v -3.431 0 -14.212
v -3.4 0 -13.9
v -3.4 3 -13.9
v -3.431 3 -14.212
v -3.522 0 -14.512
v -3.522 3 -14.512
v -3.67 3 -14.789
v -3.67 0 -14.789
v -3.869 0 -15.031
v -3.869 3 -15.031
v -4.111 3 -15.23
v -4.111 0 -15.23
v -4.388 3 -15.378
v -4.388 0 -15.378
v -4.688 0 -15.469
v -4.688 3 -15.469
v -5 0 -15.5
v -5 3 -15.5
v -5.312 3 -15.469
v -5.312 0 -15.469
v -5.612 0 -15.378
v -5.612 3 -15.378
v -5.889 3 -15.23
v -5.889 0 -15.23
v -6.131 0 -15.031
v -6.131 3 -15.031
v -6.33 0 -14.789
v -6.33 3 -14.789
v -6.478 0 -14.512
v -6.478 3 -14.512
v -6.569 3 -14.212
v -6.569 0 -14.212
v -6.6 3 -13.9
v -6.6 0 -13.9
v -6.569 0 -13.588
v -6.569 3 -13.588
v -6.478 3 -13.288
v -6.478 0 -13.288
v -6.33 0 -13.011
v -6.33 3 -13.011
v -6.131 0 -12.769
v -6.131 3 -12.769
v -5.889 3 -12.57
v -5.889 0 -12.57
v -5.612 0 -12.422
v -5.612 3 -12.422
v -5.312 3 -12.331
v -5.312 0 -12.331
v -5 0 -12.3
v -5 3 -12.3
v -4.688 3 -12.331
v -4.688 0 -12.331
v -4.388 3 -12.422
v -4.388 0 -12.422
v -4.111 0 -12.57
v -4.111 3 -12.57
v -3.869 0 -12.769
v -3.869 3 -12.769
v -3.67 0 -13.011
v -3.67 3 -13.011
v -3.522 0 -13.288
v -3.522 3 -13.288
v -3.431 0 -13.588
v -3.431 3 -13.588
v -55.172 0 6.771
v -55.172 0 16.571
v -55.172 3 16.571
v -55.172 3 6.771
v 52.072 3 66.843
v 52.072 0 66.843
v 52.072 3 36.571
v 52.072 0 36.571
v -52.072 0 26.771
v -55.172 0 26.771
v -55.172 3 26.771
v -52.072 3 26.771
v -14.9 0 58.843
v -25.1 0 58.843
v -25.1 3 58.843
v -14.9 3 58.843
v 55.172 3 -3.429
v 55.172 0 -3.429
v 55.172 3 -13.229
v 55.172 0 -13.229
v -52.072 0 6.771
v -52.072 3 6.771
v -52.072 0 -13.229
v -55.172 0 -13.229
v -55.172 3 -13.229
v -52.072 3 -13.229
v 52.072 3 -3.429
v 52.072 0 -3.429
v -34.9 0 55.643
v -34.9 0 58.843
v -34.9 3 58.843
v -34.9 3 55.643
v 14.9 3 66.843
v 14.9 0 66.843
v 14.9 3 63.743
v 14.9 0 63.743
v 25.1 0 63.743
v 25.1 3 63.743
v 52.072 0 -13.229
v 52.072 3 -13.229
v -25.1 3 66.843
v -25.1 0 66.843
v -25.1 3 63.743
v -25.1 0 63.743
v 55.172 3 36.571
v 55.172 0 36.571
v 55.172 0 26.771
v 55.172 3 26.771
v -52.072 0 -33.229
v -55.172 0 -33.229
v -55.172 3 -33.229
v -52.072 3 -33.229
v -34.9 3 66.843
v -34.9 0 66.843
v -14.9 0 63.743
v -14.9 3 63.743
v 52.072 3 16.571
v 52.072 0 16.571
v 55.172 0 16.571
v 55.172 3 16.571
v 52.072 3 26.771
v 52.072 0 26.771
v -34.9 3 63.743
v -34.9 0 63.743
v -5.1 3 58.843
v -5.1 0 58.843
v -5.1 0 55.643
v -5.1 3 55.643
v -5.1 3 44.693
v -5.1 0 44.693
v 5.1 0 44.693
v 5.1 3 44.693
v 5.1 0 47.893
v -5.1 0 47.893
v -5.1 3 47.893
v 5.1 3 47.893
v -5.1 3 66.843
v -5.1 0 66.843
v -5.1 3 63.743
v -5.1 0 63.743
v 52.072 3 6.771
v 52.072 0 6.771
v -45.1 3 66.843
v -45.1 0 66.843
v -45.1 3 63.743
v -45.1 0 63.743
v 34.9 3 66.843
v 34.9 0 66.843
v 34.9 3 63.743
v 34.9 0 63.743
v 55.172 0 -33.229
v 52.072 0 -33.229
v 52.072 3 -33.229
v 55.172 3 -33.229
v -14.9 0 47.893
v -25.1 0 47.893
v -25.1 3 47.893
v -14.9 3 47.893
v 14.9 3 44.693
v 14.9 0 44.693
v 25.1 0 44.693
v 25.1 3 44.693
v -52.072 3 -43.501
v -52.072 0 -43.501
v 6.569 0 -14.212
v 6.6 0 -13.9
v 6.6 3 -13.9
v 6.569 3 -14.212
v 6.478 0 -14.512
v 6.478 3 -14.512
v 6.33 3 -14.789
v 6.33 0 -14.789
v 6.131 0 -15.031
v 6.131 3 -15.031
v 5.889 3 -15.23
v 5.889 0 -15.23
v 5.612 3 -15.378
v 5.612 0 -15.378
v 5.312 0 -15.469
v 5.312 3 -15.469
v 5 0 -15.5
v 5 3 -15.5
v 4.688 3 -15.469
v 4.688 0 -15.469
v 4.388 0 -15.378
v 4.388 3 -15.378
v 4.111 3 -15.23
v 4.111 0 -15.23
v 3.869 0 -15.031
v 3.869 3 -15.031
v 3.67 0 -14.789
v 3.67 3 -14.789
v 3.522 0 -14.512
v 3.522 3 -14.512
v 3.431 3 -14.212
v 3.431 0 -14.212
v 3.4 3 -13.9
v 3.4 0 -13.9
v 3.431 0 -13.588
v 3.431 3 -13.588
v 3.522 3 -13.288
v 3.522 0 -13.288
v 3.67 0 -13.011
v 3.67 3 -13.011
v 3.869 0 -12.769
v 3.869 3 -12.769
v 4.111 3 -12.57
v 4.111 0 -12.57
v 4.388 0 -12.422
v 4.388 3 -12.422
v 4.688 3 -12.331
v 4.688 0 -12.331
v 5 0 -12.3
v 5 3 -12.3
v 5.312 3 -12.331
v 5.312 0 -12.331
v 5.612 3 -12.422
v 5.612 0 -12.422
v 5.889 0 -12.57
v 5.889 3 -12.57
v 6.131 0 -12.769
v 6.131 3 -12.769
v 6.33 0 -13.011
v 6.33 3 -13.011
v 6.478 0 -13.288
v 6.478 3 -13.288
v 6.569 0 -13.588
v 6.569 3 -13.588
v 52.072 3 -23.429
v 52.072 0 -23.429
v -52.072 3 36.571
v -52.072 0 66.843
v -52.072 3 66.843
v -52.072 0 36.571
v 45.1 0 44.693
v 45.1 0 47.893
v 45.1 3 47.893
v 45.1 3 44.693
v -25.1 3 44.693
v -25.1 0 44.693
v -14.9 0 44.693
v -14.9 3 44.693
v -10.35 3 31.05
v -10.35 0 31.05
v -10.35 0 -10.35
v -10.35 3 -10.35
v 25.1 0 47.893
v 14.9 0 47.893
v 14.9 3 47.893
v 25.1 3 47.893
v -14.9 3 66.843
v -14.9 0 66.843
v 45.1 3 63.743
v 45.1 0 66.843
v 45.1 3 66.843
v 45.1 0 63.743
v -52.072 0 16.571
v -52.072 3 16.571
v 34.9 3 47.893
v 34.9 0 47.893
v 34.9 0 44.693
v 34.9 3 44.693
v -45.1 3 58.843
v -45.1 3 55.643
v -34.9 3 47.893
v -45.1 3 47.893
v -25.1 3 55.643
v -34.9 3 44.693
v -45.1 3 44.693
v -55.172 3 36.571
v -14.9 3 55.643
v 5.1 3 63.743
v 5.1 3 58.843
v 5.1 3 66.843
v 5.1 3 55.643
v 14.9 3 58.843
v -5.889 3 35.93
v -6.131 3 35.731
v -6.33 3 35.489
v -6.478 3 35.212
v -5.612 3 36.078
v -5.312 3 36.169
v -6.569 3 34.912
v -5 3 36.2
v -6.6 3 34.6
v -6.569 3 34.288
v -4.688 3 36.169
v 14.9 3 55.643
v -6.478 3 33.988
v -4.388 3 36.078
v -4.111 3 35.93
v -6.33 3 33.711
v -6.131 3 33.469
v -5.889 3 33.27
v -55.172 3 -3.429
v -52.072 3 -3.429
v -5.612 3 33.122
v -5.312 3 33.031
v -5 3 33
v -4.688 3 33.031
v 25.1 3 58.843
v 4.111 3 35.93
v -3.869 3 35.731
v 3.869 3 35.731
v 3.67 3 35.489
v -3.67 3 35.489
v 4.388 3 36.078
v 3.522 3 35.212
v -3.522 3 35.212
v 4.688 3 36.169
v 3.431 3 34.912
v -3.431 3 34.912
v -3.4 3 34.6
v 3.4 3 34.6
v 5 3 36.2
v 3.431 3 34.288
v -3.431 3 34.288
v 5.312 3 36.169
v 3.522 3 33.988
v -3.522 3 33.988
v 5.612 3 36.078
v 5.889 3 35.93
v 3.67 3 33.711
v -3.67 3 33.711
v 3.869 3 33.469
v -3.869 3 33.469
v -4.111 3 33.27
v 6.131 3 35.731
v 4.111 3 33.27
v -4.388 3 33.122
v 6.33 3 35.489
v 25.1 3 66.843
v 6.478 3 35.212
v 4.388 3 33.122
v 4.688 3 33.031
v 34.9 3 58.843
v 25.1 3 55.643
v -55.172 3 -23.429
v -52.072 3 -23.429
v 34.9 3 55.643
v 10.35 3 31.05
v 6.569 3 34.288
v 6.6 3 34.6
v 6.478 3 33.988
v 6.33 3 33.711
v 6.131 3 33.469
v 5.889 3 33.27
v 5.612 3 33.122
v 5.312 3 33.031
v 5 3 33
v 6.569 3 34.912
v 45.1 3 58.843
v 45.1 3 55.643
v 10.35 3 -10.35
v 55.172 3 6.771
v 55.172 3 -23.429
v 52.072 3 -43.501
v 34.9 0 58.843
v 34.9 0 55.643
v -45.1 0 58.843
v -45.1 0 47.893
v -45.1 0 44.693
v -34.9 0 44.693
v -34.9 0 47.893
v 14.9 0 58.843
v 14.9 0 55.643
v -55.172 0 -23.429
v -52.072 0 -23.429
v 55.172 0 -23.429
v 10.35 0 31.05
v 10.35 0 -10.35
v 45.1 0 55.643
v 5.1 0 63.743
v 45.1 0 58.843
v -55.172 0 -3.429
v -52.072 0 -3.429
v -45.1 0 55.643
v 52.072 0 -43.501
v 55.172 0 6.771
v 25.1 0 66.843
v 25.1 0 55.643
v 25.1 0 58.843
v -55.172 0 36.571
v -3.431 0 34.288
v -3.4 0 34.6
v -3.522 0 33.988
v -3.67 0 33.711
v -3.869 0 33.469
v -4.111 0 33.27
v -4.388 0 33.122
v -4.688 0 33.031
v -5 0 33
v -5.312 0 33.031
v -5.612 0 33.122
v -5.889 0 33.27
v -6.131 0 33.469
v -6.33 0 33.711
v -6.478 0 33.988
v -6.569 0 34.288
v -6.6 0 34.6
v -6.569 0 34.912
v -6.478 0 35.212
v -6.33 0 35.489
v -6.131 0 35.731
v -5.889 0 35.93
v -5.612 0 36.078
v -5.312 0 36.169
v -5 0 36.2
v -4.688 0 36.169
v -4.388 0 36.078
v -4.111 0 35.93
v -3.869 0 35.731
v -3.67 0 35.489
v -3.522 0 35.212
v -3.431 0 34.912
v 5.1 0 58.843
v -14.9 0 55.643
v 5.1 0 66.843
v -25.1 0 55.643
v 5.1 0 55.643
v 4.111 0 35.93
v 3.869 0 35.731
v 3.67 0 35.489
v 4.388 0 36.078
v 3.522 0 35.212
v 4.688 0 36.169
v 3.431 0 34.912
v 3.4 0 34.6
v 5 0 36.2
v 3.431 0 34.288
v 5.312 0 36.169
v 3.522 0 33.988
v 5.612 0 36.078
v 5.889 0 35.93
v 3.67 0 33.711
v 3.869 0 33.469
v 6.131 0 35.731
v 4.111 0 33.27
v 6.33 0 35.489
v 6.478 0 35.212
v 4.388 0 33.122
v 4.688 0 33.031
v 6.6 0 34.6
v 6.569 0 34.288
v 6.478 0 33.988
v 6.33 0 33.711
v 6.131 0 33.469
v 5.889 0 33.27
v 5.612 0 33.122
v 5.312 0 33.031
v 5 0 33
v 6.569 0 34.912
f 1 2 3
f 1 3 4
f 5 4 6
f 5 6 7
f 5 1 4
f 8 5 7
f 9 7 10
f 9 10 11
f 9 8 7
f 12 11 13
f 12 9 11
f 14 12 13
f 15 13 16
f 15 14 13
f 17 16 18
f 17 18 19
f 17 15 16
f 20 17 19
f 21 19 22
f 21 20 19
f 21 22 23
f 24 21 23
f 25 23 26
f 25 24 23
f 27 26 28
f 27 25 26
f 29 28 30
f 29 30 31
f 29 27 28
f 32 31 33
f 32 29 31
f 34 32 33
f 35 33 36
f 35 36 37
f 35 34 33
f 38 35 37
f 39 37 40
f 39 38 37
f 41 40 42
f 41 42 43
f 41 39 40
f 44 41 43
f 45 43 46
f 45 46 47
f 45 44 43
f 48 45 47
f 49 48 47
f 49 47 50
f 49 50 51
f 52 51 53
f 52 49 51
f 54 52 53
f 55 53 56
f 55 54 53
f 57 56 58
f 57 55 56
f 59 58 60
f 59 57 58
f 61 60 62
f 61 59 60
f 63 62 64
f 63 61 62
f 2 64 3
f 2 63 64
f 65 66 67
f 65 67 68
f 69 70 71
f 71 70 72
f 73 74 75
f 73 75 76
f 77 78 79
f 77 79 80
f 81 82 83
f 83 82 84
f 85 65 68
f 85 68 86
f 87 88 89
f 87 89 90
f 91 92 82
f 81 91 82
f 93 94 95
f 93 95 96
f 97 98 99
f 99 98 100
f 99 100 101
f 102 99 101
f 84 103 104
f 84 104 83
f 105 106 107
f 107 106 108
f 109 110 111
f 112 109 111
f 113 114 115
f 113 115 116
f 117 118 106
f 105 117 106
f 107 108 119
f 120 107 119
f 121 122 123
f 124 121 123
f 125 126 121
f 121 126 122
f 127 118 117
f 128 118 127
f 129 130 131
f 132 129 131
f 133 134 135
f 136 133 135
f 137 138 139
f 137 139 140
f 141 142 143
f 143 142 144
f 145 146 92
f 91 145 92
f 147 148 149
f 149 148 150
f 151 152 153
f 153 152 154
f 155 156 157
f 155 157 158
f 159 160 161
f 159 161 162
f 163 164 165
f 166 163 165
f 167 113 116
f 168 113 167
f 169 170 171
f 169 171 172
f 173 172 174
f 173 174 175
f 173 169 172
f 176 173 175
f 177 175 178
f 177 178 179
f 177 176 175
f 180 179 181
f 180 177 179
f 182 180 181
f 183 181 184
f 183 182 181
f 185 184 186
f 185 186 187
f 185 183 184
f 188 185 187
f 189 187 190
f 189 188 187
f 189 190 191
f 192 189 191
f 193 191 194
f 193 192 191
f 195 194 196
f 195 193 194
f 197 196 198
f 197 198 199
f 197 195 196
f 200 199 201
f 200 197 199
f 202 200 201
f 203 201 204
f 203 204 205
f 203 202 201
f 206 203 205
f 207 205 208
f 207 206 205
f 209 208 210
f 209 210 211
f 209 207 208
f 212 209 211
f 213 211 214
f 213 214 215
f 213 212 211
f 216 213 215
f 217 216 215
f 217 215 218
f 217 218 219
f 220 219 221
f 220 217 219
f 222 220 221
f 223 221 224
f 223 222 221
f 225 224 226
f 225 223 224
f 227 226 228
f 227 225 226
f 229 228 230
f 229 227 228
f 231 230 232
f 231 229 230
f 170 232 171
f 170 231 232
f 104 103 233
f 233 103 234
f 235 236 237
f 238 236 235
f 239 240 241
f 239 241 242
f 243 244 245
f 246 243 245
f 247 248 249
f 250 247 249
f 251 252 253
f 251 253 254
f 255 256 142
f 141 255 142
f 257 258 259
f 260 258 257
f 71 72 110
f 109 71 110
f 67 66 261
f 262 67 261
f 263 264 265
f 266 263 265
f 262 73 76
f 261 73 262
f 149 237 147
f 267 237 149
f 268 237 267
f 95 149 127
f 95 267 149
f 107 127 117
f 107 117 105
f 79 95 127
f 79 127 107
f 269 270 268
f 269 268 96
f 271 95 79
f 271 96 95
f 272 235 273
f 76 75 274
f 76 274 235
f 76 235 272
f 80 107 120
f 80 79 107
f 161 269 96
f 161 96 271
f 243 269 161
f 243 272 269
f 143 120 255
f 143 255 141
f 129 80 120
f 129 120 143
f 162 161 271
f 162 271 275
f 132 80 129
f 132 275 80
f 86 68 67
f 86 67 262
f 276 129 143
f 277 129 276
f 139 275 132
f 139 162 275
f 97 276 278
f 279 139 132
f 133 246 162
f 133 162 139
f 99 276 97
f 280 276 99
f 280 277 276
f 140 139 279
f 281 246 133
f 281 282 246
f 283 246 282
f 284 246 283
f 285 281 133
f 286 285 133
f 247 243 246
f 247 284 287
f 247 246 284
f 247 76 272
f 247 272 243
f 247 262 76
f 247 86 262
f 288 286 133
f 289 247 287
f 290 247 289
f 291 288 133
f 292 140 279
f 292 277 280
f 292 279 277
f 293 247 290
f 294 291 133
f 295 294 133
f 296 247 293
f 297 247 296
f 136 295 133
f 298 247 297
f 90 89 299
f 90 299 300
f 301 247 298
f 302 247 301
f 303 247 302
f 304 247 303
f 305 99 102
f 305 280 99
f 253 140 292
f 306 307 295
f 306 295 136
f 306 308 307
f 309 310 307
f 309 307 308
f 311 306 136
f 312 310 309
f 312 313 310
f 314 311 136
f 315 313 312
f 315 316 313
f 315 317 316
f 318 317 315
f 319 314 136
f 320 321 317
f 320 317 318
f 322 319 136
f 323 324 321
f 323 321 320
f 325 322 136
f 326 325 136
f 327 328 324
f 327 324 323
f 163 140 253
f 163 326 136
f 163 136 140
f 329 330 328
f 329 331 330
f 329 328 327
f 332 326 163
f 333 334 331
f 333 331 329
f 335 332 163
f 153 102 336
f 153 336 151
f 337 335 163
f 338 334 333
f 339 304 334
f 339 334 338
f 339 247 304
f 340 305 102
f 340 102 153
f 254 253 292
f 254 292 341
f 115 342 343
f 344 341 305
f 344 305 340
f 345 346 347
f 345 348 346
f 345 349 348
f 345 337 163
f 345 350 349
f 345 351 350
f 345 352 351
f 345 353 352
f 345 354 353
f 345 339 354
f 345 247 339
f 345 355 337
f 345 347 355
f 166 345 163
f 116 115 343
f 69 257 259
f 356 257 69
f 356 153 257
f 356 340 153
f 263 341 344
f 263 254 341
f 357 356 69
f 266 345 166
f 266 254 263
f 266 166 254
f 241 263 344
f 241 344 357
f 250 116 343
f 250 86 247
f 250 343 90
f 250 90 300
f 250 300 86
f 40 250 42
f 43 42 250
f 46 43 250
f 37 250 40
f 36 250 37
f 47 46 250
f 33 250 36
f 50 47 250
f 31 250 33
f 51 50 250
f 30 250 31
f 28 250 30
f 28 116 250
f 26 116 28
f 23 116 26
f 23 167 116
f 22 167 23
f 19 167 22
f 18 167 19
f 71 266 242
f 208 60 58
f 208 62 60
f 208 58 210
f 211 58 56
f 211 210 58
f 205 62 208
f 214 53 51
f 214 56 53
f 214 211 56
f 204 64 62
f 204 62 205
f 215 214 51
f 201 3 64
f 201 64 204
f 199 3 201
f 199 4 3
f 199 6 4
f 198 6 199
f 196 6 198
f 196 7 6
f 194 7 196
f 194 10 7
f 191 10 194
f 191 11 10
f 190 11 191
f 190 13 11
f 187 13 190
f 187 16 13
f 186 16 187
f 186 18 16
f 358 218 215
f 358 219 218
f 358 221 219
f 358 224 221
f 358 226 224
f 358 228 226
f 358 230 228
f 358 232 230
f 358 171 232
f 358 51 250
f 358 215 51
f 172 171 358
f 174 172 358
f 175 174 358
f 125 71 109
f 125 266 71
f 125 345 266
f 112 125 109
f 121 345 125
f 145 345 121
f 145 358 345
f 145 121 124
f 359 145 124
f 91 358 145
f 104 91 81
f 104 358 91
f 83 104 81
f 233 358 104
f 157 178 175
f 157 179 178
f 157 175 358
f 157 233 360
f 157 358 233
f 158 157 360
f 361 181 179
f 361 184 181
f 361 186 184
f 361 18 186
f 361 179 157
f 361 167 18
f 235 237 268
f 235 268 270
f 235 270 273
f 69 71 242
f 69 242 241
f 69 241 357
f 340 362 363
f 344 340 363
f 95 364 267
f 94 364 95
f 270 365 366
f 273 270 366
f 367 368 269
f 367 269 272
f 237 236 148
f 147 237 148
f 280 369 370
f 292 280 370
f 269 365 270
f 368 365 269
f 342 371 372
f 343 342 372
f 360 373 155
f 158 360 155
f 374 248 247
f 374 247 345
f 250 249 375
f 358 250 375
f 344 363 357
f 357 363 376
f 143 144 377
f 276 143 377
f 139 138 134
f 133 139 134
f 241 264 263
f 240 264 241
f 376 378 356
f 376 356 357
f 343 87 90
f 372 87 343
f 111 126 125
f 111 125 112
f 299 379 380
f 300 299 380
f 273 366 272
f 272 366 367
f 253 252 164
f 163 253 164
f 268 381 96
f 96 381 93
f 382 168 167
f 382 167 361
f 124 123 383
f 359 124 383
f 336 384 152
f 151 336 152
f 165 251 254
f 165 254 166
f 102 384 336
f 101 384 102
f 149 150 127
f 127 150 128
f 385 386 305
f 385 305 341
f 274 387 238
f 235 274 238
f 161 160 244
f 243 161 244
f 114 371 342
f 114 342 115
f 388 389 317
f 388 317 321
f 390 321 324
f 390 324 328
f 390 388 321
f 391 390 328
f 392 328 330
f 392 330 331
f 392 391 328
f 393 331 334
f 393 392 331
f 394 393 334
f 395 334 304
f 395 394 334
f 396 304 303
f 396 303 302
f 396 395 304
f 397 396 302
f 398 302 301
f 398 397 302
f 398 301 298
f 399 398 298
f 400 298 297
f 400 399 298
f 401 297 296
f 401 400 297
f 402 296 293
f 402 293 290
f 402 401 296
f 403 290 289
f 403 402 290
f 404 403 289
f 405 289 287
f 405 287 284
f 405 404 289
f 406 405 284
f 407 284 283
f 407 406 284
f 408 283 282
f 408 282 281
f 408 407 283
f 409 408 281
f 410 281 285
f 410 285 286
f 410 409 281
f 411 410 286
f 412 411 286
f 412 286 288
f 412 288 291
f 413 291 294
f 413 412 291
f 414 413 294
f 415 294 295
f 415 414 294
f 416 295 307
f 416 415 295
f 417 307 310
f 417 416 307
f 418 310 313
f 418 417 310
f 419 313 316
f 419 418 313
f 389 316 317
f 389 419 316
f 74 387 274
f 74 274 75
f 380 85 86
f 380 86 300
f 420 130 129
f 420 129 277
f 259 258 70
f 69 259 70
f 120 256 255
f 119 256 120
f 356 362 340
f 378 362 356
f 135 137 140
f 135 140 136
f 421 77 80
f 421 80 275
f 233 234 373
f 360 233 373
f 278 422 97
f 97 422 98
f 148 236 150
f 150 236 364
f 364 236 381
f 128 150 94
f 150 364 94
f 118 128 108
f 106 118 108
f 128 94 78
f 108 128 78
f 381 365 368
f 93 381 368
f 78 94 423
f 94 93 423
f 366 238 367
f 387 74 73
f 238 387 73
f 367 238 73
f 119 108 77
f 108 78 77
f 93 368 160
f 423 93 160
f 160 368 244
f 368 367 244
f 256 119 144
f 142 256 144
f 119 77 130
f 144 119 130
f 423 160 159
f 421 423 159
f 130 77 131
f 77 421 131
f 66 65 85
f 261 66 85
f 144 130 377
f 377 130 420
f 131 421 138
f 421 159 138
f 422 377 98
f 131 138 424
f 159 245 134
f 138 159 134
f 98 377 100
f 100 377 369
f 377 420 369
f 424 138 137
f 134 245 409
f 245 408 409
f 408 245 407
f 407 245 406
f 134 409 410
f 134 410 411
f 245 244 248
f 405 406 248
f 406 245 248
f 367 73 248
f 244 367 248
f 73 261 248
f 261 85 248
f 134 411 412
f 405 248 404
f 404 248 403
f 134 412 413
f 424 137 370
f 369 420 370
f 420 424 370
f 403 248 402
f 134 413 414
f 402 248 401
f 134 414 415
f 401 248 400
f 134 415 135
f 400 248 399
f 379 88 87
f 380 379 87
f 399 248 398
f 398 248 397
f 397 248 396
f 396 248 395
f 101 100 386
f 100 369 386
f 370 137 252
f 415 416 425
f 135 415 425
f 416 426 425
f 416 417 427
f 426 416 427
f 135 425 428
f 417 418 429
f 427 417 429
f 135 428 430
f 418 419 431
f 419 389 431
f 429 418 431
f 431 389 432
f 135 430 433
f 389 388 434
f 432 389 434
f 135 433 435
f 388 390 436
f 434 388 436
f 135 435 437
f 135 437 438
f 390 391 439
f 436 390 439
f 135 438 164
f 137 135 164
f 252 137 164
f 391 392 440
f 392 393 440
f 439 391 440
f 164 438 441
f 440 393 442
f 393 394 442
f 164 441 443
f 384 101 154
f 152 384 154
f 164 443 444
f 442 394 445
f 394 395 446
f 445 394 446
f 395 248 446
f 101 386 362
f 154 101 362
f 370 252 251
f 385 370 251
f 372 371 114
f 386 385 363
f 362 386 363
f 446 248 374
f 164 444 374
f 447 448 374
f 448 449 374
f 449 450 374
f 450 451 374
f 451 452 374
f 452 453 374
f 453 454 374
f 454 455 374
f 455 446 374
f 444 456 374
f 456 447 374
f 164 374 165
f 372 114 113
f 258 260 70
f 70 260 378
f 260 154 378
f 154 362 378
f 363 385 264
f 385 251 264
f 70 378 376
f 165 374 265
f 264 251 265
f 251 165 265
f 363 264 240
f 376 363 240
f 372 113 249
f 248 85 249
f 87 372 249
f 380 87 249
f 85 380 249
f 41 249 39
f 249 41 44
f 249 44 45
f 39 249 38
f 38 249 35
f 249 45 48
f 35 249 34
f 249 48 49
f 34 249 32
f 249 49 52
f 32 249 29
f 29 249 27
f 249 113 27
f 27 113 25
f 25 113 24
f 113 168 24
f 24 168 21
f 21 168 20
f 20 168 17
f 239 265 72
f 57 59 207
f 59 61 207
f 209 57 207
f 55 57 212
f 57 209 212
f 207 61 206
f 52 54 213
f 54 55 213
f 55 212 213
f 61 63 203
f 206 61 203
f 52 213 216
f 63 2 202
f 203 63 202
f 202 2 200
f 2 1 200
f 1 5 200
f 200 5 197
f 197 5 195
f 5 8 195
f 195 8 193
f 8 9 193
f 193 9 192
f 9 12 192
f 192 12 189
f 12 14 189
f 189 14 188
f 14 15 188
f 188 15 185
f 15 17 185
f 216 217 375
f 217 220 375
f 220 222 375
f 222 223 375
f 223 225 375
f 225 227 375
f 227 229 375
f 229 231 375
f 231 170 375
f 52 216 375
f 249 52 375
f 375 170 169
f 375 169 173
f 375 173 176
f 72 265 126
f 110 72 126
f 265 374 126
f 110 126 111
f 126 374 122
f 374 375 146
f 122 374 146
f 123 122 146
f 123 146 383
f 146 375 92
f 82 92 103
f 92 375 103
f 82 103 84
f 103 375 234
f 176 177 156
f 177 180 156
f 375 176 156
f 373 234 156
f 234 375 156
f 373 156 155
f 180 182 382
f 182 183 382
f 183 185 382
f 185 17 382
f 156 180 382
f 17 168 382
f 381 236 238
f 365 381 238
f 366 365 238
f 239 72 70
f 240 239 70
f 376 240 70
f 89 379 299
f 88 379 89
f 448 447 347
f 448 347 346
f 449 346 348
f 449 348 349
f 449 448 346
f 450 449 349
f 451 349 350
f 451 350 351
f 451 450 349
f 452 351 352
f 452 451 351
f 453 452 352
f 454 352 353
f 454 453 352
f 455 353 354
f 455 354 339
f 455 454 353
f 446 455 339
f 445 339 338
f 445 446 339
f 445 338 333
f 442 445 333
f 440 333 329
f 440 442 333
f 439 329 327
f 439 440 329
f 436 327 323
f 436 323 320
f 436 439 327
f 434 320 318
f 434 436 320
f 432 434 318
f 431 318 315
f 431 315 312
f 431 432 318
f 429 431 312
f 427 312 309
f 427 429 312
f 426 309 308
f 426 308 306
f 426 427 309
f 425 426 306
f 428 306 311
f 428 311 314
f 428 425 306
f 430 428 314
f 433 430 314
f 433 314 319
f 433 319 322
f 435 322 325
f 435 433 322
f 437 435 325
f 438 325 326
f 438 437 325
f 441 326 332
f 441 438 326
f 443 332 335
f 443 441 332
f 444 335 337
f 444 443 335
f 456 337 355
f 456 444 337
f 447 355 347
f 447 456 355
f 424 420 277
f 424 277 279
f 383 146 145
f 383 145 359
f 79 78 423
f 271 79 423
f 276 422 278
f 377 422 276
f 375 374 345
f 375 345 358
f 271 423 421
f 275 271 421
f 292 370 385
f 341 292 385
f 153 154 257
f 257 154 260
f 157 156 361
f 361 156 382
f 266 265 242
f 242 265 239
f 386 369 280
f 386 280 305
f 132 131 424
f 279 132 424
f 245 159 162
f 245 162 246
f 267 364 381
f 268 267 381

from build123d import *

# Parameters (mm, degrees)
SKETCH1_W           = 110.344434204
SKETCH1_H           = 110.344434204
SKETCH1_R           = 1.6
SKETCH1_W_2         = 20.7
SKETCH1_H_2         = 41.4
BOSS_EXTRUDE1_DEPTH = 3
SKETCH3_W           = 3.2
SKETCH3_H           = 10.2
SKETCH3_H_2         = 10.372217102
SKETCH3_W_2         = 10.2
SKETCH3_H_3         = 3.2
SKETCH3_H_4         = 30.372217102
CUT_EXTRUDE1_DEPTH  = 4


with BuildPart() as part:
    # Sketch1 → Boss-Extrude1 (new body)
    with BuildSketch(Plane(origin=(0, 0, 0), x_dir=(1, 0, 0), z_dir=(0, 1, 0))):
        with Locations((0, -11.670773756)):
            Rectangle(SKETCH1_W, SKETCH1_H)
        with Locations((-5, 13.9)):
            Circle(SKETCH1_R, mode=Mode.SUBTRACT)
        with Locations((5, 13.9)):
            Circle(SKETCH1_R, mode=Mode.SUBTRACT)
        with Locations((5, -34.6)):
            Circle(SKETCH1_R, mode=Mode.SUBTRACT)
        with Locations((-5, -34.6)):
            Circle(SKETCH1_R, mode=Mode.SUBTRACT)
        with Locations((0, -10.35)):
            Rectangle(SKETCH1_W_2, SKETCH1_H_2, mode=Mode.SUBTRACT)
    extrude(amount=BOSS_EXTRUDE1_DEPTH)

    # Sketch3 → Cut-Extrude1 (cut, through all)
    with BuildSketch(Plane(origin=(0, 0, 0), x_dir=(1, 0, 0), z_dir=(0, 1, 0))):
        with Locations((53.672217102, -1.670773756)):
            Rectangle(SKETCH3_W, SKETCH3_H)
        with Locations((53.672217102, 18.329226244)):
            Rectangle(SKETCH3_W, SKETCH3_H)
        with Locations((53.672217102, 38.415334795)):
            Rectangle(SKETCH3_W, SKETCH3_H_2)
        with Locations((40, -46.292990858)):
            Rectangle(SKETCH3_W_2, SKETCH3_H_3)
        with Locations((53.672217102, -21.670773756)):
            Rectangle(SKETCH3_W, SKETCH3_H)
        with Locations((20, -46.292990858)):
            Rectangle(SKETCH3_W_2, SKETCH3_H_3)
        with Locations((0, -46.292990858)):
            Rectangle(SKETCH3_W_2, SKETCH3_H_3)
        with Locations((-20, -46.292990858)):
            Rectangle(SKETCH3_W_2, SKETCH3_H_3)
        with Locations((-40, -46.292990858)):
            Rectangle(SKETCH3_W_2, SKETCH3_H_3)
        with Locations((-53.672217102, 38.415334795)):
            Rectangle(SKETCH3_W, SKETCH3_H_2)
        with Locations((-53.672217102, 18.329226244)):
            Rectangle(SKETCH3_W, SKETCH3_H)
        with Locations((-53.672217102, -1.670773756)):
            Rectangle(SKETCH3_W, SKETCH3_H)
        with Locations((-53.672217102, -21.670773756)):
            Rectangle(SKETCH3_W, SKETCH3_H)
        with Locations((40, -65.342990858)):
            Rectangle(SKETCH3_W_2, SKETCH3_H_3)
        with Locations((53.672217102, -51.756882307)):
            Rectangle(SKETCH3_W, SKETCH3_H_4)
        with Locations((40, -57.242990858)):
            Rectangle(SKETCH3_W_2, SKETCH3_H_3)
        with Locations((20, -65.342990858)):
            Rectangle(SKETCH3_W_2, SKETCH3_H_3)
        with Locations((0, -65.342990858)):
            Rectangle(SKETCH3_W_2, SKETCH3_H_3)
        with Locations((20, -57.242990858)):
            Rectangle(SKETCH3_W_2, SKETCH3_H_3)
        with Locations((0, -57.242990858)):
            Rectangle(SKETCH3_W_2, SKETCH3_H_3)
        with Locations((-40, -65.342990858)):
            Rectangle(SKETCH3_W_2, SKETCH3_H_3)
        with Locations((-40, -57.242990858)):
            Rectangle(SKETCH3_W_2, SKETCH3_H_3)
        with Locations((-20, -57.242990858)):
            Rectangle(SKETCH3_W_2, SKETCH3_H_3)
        with Locations((-20, -65.342990858)):
            Rectangle(SKETCH3_W_2, SKETCH3_H_3)
        with Locations((-53.672217102, -51.756882307)):
            Rectangle(SKETCH3_W, SKETCH3_H_4)
    extrude(amount=CUT_EXTRUDE1_DEPTH, mode=Mode.SUBTRACT)


solid = part.part
